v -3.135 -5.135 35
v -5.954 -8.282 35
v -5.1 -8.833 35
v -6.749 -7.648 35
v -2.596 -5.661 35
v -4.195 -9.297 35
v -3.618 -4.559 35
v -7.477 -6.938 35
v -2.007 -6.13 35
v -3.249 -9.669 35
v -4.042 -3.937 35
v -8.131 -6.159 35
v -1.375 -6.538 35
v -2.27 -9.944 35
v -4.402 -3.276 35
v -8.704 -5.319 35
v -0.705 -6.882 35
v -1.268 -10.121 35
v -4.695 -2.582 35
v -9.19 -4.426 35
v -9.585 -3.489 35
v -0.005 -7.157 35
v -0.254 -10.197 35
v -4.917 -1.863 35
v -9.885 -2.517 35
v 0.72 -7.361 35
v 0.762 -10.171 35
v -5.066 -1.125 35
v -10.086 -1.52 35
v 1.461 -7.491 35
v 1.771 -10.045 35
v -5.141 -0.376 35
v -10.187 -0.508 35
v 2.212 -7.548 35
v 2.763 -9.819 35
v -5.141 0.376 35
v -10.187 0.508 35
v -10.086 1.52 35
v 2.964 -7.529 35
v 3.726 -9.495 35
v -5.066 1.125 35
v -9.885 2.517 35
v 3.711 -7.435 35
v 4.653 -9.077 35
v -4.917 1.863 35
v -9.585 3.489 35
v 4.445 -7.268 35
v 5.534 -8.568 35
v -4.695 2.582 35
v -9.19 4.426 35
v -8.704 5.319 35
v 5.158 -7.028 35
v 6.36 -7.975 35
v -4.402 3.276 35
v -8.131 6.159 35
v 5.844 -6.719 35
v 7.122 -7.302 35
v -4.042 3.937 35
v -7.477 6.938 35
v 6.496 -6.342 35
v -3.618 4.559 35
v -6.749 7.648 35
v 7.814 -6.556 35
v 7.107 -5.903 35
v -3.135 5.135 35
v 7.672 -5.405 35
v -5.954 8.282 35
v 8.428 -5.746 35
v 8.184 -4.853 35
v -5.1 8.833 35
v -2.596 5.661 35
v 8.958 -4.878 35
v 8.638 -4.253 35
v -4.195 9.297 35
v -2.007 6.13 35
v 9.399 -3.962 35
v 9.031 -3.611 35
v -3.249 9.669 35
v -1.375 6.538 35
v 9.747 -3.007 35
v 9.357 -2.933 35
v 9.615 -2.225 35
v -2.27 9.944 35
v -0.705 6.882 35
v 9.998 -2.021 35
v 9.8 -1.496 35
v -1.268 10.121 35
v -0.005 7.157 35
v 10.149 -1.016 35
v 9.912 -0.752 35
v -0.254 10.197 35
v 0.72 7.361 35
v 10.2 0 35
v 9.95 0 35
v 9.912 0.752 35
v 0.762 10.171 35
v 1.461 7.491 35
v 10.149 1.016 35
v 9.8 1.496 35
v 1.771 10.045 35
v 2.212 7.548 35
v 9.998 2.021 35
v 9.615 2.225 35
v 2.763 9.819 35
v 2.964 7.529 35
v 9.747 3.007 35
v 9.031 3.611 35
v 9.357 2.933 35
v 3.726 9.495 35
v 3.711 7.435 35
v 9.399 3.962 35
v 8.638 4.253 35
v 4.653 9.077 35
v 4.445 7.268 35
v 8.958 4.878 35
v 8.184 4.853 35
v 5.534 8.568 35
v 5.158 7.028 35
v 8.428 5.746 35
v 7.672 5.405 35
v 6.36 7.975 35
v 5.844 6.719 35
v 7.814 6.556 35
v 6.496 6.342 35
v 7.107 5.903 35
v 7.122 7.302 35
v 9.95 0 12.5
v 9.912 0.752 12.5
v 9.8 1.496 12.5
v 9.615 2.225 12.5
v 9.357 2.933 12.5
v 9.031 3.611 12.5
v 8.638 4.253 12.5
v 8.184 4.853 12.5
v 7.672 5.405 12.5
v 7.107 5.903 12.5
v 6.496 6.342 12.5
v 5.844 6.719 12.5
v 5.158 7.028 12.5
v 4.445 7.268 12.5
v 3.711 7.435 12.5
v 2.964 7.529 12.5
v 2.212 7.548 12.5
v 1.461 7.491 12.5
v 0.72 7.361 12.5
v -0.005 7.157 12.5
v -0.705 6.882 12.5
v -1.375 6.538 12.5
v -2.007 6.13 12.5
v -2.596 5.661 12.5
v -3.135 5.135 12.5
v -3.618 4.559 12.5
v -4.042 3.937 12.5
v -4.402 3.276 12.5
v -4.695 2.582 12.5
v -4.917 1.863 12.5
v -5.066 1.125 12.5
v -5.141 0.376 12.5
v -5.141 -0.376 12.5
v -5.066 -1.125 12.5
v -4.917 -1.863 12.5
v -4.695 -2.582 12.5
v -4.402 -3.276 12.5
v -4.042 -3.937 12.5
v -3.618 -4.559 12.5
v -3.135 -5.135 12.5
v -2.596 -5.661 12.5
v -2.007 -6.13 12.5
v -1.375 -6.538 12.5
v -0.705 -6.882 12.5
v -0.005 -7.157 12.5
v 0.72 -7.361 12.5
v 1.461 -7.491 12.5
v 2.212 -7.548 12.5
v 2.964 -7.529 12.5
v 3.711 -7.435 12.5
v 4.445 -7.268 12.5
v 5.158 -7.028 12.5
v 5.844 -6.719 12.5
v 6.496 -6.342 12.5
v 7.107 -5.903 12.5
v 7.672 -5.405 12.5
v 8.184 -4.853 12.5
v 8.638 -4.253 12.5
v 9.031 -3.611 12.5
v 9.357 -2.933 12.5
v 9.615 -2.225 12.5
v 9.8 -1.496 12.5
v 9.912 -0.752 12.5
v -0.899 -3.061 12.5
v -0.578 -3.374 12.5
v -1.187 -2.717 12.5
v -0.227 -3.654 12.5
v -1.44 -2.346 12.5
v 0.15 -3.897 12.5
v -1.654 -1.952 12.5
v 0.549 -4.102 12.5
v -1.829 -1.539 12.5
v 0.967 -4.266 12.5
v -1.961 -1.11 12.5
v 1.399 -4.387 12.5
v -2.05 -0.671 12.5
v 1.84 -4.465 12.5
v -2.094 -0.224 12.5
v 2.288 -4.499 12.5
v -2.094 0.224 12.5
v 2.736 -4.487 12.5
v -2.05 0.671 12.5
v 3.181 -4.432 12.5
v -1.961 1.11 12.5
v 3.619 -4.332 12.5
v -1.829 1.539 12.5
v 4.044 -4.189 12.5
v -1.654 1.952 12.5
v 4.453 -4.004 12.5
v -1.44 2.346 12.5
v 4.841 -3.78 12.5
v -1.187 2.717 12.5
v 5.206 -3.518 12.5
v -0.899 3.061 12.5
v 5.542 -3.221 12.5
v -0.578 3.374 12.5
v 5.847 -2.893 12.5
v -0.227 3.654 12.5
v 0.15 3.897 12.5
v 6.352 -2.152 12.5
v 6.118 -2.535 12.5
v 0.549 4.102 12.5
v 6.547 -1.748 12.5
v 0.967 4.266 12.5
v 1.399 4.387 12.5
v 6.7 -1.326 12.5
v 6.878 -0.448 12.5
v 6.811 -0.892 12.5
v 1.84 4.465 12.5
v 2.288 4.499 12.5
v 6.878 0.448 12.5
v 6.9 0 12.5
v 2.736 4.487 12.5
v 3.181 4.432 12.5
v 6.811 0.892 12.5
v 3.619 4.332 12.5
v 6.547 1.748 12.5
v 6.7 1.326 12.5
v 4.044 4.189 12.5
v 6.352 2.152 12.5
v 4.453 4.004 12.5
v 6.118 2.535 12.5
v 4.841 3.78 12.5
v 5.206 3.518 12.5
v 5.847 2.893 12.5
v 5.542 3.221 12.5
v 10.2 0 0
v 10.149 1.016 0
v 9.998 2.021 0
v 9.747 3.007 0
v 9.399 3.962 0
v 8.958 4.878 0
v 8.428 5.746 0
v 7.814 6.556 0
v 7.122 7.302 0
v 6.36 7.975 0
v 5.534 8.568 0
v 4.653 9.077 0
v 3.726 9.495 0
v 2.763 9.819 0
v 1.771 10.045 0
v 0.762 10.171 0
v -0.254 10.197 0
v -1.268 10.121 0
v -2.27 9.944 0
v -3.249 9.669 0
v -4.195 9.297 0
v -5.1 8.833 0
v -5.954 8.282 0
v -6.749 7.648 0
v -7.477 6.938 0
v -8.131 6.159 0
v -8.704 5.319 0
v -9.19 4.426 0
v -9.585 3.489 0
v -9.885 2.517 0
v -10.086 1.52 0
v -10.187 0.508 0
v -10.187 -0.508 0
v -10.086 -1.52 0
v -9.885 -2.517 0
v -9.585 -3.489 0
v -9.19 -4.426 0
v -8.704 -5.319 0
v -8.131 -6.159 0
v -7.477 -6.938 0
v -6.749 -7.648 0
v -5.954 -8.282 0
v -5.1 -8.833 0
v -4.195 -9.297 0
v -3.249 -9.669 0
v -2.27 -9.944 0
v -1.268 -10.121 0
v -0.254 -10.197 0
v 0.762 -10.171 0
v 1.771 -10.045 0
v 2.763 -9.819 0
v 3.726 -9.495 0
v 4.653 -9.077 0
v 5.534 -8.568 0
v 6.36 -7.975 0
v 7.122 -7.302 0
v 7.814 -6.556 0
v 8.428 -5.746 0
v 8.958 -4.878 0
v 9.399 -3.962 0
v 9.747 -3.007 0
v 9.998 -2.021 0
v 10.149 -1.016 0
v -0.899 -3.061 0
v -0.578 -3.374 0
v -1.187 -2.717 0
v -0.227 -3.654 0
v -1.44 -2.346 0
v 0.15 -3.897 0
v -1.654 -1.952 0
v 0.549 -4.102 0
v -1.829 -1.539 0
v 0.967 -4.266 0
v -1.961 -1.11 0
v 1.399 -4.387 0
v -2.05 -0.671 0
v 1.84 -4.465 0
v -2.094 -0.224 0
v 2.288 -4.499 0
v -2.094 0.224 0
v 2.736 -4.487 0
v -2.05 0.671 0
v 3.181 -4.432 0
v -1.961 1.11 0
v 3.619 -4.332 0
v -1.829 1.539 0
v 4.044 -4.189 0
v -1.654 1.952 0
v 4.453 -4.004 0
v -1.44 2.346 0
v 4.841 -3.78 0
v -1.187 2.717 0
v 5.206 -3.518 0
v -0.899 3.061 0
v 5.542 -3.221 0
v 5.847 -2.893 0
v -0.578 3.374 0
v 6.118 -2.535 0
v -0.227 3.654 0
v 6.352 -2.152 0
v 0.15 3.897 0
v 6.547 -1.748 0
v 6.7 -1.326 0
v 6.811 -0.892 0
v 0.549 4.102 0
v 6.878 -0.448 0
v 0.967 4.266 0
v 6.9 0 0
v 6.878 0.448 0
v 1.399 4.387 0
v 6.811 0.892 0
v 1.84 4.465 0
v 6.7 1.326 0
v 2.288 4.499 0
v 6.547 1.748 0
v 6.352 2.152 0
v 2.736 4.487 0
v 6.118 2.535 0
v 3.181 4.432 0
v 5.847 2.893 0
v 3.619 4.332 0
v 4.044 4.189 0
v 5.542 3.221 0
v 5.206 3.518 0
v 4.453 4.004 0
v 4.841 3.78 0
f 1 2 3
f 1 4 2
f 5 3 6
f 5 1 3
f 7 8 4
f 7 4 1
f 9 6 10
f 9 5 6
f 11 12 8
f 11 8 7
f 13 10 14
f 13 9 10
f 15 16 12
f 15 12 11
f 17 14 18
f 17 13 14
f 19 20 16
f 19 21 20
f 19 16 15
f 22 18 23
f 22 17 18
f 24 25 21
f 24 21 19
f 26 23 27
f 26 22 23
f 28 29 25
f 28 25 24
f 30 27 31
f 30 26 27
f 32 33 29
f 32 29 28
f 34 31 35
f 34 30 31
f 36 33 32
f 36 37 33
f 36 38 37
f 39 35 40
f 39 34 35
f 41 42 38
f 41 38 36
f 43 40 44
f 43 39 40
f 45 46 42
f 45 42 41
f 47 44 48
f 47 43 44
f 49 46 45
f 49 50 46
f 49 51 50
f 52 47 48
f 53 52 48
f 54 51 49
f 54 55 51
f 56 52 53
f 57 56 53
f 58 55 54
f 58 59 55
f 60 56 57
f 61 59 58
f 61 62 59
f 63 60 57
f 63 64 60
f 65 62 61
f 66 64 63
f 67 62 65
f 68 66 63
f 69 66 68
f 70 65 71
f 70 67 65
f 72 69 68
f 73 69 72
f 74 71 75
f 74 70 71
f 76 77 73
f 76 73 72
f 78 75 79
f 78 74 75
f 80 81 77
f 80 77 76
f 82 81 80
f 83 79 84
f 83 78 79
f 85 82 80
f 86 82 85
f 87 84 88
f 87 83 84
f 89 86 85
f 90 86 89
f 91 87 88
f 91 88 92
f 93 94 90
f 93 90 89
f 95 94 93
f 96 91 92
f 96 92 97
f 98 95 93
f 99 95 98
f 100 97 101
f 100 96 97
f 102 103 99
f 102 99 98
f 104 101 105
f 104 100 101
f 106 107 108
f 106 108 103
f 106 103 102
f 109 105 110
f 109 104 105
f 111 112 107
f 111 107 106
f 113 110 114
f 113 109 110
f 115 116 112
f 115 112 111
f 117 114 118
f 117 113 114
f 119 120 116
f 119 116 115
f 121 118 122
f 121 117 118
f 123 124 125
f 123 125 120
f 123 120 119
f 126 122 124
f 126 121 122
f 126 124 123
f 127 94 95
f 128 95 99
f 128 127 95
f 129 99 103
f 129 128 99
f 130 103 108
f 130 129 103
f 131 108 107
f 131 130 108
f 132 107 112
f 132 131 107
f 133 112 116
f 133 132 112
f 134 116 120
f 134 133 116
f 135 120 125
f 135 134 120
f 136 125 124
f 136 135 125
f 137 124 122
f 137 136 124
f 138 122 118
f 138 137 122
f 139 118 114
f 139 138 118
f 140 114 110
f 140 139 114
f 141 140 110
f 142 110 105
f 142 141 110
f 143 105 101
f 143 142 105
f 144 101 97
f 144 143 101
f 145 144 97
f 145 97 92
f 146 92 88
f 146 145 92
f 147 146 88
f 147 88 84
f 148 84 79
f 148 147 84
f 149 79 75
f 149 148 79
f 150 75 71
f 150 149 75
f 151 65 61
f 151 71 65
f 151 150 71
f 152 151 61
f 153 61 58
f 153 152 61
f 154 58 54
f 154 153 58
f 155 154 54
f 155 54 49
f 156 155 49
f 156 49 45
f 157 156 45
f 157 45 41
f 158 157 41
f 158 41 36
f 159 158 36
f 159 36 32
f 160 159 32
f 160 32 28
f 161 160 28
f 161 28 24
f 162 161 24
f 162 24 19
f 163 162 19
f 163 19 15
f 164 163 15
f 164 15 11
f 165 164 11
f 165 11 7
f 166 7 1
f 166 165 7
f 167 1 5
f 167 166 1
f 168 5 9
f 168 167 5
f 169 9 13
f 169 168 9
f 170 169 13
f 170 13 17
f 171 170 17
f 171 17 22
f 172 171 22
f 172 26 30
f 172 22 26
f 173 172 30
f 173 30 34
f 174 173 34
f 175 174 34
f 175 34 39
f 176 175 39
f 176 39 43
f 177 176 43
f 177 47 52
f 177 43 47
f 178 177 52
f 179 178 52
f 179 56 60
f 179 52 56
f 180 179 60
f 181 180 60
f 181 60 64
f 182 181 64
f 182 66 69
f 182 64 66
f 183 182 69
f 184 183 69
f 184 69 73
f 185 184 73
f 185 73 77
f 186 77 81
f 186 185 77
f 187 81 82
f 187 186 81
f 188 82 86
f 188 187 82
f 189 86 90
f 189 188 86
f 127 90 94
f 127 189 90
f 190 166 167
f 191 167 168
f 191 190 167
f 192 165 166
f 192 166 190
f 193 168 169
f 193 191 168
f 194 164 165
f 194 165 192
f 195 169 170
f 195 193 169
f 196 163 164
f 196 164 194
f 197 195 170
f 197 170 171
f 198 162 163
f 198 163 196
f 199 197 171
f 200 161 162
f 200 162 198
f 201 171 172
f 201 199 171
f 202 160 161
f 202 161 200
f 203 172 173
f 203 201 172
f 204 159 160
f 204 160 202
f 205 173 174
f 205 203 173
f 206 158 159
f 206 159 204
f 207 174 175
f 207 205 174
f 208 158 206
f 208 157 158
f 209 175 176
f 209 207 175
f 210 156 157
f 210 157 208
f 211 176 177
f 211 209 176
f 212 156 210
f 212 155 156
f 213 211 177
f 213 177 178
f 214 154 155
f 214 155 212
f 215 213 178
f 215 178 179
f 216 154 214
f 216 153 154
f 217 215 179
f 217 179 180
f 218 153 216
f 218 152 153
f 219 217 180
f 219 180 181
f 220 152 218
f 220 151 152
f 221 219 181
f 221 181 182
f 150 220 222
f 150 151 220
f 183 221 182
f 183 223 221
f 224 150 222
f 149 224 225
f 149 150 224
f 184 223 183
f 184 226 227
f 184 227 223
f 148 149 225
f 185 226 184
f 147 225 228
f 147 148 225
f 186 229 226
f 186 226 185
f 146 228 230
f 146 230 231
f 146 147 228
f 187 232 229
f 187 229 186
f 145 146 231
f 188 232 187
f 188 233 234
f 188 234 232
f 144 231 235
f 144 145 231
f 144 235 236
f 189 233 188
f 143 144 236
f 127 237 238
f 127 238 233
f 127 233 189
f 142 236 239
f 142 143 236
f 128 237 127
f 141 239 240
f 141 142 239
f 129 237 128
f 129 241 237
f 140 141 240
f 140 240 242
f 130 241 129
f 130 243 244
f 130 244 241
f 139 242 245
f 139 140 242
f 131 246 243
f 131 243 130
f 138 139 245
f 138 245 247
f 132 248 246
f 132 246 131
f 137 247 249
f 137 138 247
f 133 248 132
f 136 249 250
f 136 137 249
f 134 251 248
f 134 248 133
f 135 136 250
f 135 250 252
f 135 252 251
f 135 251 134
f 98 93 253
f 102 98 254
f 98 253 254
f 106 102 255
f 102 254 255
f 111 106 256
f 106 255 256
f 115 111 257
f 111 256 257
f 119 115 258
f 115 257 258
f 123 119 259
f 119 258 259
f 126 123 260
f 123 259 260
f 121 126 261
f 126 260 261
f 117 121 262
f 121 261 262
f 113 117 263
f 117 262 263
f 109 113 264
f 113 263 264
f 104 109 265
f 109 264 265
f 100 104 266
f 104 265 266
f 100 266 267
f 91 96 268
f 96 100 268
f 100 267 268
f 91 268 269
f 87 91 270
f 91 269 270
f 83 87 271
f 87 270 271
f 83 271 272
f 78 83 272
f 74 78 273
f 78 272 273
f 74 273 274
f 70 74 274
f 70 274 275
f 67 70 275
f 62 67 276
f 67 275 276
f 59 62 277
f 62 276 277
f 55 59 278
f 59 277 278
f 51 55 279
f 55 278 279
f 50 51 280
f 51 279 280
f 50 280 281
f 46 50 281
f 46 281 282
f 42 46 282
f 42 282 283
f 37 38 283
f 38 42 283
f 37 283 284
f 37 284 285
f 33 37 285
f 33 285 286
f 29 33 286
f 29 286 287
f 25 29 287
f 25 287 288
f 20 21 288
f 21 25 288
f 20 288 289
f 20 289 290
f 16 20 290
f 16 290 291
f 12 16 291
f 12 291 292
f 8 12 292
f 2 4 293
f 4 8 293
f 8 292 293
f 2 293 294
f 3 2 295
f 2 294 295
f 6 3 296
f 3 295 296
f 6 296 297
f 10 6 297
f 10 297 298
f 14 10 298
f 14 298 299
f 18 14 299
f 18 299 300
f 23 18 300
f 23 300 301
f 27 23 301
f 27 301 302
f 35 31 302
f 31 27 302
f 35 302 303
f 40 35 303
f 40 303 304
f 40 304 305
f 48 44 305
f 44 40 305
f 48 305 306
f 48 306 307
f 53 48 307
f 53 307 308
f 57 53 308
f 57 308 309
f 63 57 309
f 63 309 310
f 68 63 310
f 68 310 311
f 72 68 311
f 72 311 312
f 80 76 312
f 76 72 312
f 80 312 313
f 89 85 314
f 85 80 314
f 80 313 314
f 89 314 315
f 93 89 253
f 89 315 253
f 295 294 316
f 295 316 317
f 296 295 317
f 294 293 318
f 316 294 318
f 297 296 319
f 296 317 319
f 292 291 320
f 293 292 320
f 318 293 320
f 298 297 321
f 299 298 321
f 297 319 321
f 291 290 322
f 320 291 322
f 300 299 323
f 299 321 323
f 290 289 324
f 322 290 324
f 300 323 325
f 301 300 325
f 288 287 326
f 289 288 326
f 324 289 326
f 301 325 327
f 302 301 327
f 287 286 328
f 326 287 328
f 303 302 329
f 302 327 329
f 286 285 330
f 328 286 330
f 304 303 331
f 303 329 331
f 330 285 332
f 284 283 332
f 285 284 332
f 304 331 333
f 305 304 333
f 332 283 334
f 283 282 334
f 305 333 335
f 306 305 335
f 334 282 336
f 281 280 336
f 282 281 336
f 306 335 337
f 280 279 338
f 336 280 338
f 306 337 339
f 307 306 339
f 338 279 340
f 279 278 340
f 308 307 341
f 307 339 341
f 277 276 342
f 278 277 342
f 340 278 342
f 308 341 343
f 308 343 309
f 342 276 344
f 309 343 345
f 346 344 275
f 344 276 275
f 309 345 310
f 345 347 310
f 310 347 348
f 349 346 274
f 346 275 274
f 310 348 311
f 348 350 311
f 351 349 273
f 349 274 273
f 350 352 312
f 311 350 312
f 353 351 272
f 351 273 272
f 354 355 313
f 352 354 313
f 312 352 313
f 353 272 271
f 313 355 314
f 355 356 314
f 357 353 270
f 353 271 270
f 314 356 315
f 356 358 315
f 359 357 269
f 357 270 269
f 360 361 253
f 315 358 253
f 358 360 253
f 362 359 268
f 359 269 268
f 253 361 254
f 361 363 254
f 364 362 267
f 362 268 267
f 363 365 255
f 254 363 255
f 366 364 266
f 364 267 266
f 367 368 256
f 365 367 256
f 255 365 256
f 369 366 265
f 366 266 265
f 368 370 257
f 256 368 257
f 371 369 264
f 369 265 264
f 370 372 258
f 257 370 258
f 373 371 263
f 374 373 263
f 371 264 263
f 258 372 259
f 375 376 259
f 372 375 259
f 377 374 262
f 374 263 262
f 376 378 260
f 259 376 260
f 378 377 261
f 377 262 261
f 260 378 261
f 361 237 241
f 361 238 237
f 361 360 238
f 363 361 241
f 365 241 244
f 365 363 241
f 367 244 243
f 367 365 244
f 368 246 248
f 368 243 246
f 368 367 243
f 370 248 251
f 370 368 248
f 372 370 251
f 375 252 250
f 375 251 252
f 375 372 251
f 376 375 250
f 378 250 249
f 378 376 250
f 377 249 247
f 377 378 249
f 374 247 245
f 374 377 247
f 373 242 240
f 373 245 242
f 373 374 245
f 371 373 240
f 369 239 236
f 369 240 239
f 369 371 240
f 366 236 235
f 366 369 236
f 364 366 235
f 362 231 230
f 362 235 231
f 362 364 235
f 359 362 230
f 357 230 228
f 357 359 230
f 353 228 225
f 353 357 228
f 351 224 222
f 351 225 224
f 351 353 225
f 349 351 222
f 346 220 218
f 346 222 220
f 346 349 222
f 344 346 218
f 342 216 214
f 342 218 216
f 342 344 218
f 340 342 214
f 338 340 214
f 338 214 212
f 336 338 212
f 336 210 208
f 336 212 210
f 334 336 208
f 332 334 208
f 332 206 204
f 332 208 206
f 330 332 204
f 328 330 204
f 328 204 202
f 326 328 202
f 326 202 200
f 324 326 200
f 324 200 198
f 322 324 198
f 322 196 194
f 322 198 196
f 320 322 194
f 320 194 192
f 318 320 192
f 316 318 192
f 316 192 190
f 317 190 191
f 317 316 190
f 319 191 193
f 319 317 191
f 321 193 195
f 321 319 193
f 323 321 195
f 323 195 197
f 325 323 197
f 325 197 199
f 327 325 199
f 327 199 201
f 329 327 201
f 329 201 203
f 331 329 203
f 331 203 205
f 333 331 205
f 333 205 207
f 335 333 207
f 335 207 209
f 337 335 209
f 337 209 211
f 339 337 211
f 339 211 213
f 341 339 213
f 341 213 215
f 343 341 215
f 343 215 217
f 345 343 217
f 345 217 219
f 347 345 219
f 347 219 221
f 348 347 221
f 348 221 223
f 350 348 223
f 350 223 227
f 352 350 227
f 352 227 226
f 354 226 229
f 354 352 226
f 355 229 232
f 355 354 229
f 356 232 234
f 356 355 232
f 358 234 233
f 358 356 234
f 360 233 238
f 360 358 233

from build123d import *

# Parameters (mm, degrees)
CYLINDER005_R     = 10.2
CYLINDER005_DEPTH = 4
CYLINDER006_R     = 14
CYLINDER006_DEPTH = 4
BOX_W             = 30
BOX_H             = 30
BOX_DEPTH         = 36
CYLINDER004_R     = 4.5
CYLINDER004_DEPTH = 100
CYLINDER_R        = 7.55
CYLINDER_DEPTH    = 45
CYLINDER001_R     = 10.2
CYLINDER001_DEPTH = 70
CYLINDER002_R     = 13
CYLINDER002_DEPTH = 4
CYLINDER003_R     = 13
CYLINDER003_DEPTH = 4


with BuildPart() as cilindro001:
    # Cylinder005 → Cylinder005 (new body)
    with BuildSketch(Plane.XY):
        Circle(CYLINDER005_R)
    extrude(amount=CYLINDER005_DEPTH)


with BuildPart() as cut003:
    # Cylinder006 → Cylinder006 (new body)
    with BuildSketch(Plane.XY):
        Circle(CYLINDER006_R)
    extrude(amount=CYLINDER006_DEPTH)

    # Cut003: cut Cilindro001
    add(cilindro001.part, mode=Mode.SUBTRACT)


with BuildPart() as cubo:
    # Box → Box (new body)
    with BuildSketch(Plane(origin=(-15, -15, 35), x_dir=(1, 0, 0), z_dir=(0, 0, 1))):
        with Locations((15, 15)):
            Rectangle(BOX_W, BOX_H)
    extrude(amount=BOX_DEPTH)


with BuildPart() as cilindro:
    # Cylinder004 → Cylinder004 (new body)
    with BuildSketch(Plane(origin=(2.4, 0, -14), x_dir=(1, 0, 0), z_dir=(0, 0, 1))):
        Circle(CYLINDER004_R)
    extrude(amount=CYLINDER004_DEPTH)


with BuildPart() as rodamiento:
    # Cylinder → Cylinder (new body)
    with BuildSketch(Plane(origin=(2.4, 0, 12.5), x_dir=(1, 0, 0), z_dir=(0, 0, 1))):
        Circle(CYLINDER_R)
    extrude(amount=CYLINDER_DEPTH)


with BuildPart() as pieza_azul:
    # Cylinder001 → Cylinder001 (new body)
    with BuildSketch(Plane.XY):
        Circle(CYLINDER001_R)
    extrude(amount=CYLINDER001_DEPTH)


with BuildPart() as tapa1:
    # Cylinder002 → Cylinder002 (new body)
    with BuildSketch(Plane.XY):
        Circle(CYLINDER002_R)
    extrude(amount=CYLINDER002_DEPTH)


with BuildPart() as cut004:
    # Cylinder003 → Cylinder003 (new body)
    with BuildSketch(Plane.XY.offset(66)):
        Circle(CYLINDER003_R)
    extrude(amount=CYLINDER003_DEPTH)

    # Fusion: union pieza_azul, tapa1
    add(pieza_azul.part)
    add(tapa1.part)

    # Cut: cut rodamiento
    add(rodamiento.part, mode=Mode.SUBTRACT)

    # Cut001: cut Cilindro
    add(cilindro.part, mode=Mode.SUBTRACT)

    # Cut002: cut Cubo
    add(cubo.part, mode=Mode.SUBTRACT)

    # Cut004: cut Cut003
    add(cut003.part, mode=Mode.SUBTRACT)


solid = cut004.part
